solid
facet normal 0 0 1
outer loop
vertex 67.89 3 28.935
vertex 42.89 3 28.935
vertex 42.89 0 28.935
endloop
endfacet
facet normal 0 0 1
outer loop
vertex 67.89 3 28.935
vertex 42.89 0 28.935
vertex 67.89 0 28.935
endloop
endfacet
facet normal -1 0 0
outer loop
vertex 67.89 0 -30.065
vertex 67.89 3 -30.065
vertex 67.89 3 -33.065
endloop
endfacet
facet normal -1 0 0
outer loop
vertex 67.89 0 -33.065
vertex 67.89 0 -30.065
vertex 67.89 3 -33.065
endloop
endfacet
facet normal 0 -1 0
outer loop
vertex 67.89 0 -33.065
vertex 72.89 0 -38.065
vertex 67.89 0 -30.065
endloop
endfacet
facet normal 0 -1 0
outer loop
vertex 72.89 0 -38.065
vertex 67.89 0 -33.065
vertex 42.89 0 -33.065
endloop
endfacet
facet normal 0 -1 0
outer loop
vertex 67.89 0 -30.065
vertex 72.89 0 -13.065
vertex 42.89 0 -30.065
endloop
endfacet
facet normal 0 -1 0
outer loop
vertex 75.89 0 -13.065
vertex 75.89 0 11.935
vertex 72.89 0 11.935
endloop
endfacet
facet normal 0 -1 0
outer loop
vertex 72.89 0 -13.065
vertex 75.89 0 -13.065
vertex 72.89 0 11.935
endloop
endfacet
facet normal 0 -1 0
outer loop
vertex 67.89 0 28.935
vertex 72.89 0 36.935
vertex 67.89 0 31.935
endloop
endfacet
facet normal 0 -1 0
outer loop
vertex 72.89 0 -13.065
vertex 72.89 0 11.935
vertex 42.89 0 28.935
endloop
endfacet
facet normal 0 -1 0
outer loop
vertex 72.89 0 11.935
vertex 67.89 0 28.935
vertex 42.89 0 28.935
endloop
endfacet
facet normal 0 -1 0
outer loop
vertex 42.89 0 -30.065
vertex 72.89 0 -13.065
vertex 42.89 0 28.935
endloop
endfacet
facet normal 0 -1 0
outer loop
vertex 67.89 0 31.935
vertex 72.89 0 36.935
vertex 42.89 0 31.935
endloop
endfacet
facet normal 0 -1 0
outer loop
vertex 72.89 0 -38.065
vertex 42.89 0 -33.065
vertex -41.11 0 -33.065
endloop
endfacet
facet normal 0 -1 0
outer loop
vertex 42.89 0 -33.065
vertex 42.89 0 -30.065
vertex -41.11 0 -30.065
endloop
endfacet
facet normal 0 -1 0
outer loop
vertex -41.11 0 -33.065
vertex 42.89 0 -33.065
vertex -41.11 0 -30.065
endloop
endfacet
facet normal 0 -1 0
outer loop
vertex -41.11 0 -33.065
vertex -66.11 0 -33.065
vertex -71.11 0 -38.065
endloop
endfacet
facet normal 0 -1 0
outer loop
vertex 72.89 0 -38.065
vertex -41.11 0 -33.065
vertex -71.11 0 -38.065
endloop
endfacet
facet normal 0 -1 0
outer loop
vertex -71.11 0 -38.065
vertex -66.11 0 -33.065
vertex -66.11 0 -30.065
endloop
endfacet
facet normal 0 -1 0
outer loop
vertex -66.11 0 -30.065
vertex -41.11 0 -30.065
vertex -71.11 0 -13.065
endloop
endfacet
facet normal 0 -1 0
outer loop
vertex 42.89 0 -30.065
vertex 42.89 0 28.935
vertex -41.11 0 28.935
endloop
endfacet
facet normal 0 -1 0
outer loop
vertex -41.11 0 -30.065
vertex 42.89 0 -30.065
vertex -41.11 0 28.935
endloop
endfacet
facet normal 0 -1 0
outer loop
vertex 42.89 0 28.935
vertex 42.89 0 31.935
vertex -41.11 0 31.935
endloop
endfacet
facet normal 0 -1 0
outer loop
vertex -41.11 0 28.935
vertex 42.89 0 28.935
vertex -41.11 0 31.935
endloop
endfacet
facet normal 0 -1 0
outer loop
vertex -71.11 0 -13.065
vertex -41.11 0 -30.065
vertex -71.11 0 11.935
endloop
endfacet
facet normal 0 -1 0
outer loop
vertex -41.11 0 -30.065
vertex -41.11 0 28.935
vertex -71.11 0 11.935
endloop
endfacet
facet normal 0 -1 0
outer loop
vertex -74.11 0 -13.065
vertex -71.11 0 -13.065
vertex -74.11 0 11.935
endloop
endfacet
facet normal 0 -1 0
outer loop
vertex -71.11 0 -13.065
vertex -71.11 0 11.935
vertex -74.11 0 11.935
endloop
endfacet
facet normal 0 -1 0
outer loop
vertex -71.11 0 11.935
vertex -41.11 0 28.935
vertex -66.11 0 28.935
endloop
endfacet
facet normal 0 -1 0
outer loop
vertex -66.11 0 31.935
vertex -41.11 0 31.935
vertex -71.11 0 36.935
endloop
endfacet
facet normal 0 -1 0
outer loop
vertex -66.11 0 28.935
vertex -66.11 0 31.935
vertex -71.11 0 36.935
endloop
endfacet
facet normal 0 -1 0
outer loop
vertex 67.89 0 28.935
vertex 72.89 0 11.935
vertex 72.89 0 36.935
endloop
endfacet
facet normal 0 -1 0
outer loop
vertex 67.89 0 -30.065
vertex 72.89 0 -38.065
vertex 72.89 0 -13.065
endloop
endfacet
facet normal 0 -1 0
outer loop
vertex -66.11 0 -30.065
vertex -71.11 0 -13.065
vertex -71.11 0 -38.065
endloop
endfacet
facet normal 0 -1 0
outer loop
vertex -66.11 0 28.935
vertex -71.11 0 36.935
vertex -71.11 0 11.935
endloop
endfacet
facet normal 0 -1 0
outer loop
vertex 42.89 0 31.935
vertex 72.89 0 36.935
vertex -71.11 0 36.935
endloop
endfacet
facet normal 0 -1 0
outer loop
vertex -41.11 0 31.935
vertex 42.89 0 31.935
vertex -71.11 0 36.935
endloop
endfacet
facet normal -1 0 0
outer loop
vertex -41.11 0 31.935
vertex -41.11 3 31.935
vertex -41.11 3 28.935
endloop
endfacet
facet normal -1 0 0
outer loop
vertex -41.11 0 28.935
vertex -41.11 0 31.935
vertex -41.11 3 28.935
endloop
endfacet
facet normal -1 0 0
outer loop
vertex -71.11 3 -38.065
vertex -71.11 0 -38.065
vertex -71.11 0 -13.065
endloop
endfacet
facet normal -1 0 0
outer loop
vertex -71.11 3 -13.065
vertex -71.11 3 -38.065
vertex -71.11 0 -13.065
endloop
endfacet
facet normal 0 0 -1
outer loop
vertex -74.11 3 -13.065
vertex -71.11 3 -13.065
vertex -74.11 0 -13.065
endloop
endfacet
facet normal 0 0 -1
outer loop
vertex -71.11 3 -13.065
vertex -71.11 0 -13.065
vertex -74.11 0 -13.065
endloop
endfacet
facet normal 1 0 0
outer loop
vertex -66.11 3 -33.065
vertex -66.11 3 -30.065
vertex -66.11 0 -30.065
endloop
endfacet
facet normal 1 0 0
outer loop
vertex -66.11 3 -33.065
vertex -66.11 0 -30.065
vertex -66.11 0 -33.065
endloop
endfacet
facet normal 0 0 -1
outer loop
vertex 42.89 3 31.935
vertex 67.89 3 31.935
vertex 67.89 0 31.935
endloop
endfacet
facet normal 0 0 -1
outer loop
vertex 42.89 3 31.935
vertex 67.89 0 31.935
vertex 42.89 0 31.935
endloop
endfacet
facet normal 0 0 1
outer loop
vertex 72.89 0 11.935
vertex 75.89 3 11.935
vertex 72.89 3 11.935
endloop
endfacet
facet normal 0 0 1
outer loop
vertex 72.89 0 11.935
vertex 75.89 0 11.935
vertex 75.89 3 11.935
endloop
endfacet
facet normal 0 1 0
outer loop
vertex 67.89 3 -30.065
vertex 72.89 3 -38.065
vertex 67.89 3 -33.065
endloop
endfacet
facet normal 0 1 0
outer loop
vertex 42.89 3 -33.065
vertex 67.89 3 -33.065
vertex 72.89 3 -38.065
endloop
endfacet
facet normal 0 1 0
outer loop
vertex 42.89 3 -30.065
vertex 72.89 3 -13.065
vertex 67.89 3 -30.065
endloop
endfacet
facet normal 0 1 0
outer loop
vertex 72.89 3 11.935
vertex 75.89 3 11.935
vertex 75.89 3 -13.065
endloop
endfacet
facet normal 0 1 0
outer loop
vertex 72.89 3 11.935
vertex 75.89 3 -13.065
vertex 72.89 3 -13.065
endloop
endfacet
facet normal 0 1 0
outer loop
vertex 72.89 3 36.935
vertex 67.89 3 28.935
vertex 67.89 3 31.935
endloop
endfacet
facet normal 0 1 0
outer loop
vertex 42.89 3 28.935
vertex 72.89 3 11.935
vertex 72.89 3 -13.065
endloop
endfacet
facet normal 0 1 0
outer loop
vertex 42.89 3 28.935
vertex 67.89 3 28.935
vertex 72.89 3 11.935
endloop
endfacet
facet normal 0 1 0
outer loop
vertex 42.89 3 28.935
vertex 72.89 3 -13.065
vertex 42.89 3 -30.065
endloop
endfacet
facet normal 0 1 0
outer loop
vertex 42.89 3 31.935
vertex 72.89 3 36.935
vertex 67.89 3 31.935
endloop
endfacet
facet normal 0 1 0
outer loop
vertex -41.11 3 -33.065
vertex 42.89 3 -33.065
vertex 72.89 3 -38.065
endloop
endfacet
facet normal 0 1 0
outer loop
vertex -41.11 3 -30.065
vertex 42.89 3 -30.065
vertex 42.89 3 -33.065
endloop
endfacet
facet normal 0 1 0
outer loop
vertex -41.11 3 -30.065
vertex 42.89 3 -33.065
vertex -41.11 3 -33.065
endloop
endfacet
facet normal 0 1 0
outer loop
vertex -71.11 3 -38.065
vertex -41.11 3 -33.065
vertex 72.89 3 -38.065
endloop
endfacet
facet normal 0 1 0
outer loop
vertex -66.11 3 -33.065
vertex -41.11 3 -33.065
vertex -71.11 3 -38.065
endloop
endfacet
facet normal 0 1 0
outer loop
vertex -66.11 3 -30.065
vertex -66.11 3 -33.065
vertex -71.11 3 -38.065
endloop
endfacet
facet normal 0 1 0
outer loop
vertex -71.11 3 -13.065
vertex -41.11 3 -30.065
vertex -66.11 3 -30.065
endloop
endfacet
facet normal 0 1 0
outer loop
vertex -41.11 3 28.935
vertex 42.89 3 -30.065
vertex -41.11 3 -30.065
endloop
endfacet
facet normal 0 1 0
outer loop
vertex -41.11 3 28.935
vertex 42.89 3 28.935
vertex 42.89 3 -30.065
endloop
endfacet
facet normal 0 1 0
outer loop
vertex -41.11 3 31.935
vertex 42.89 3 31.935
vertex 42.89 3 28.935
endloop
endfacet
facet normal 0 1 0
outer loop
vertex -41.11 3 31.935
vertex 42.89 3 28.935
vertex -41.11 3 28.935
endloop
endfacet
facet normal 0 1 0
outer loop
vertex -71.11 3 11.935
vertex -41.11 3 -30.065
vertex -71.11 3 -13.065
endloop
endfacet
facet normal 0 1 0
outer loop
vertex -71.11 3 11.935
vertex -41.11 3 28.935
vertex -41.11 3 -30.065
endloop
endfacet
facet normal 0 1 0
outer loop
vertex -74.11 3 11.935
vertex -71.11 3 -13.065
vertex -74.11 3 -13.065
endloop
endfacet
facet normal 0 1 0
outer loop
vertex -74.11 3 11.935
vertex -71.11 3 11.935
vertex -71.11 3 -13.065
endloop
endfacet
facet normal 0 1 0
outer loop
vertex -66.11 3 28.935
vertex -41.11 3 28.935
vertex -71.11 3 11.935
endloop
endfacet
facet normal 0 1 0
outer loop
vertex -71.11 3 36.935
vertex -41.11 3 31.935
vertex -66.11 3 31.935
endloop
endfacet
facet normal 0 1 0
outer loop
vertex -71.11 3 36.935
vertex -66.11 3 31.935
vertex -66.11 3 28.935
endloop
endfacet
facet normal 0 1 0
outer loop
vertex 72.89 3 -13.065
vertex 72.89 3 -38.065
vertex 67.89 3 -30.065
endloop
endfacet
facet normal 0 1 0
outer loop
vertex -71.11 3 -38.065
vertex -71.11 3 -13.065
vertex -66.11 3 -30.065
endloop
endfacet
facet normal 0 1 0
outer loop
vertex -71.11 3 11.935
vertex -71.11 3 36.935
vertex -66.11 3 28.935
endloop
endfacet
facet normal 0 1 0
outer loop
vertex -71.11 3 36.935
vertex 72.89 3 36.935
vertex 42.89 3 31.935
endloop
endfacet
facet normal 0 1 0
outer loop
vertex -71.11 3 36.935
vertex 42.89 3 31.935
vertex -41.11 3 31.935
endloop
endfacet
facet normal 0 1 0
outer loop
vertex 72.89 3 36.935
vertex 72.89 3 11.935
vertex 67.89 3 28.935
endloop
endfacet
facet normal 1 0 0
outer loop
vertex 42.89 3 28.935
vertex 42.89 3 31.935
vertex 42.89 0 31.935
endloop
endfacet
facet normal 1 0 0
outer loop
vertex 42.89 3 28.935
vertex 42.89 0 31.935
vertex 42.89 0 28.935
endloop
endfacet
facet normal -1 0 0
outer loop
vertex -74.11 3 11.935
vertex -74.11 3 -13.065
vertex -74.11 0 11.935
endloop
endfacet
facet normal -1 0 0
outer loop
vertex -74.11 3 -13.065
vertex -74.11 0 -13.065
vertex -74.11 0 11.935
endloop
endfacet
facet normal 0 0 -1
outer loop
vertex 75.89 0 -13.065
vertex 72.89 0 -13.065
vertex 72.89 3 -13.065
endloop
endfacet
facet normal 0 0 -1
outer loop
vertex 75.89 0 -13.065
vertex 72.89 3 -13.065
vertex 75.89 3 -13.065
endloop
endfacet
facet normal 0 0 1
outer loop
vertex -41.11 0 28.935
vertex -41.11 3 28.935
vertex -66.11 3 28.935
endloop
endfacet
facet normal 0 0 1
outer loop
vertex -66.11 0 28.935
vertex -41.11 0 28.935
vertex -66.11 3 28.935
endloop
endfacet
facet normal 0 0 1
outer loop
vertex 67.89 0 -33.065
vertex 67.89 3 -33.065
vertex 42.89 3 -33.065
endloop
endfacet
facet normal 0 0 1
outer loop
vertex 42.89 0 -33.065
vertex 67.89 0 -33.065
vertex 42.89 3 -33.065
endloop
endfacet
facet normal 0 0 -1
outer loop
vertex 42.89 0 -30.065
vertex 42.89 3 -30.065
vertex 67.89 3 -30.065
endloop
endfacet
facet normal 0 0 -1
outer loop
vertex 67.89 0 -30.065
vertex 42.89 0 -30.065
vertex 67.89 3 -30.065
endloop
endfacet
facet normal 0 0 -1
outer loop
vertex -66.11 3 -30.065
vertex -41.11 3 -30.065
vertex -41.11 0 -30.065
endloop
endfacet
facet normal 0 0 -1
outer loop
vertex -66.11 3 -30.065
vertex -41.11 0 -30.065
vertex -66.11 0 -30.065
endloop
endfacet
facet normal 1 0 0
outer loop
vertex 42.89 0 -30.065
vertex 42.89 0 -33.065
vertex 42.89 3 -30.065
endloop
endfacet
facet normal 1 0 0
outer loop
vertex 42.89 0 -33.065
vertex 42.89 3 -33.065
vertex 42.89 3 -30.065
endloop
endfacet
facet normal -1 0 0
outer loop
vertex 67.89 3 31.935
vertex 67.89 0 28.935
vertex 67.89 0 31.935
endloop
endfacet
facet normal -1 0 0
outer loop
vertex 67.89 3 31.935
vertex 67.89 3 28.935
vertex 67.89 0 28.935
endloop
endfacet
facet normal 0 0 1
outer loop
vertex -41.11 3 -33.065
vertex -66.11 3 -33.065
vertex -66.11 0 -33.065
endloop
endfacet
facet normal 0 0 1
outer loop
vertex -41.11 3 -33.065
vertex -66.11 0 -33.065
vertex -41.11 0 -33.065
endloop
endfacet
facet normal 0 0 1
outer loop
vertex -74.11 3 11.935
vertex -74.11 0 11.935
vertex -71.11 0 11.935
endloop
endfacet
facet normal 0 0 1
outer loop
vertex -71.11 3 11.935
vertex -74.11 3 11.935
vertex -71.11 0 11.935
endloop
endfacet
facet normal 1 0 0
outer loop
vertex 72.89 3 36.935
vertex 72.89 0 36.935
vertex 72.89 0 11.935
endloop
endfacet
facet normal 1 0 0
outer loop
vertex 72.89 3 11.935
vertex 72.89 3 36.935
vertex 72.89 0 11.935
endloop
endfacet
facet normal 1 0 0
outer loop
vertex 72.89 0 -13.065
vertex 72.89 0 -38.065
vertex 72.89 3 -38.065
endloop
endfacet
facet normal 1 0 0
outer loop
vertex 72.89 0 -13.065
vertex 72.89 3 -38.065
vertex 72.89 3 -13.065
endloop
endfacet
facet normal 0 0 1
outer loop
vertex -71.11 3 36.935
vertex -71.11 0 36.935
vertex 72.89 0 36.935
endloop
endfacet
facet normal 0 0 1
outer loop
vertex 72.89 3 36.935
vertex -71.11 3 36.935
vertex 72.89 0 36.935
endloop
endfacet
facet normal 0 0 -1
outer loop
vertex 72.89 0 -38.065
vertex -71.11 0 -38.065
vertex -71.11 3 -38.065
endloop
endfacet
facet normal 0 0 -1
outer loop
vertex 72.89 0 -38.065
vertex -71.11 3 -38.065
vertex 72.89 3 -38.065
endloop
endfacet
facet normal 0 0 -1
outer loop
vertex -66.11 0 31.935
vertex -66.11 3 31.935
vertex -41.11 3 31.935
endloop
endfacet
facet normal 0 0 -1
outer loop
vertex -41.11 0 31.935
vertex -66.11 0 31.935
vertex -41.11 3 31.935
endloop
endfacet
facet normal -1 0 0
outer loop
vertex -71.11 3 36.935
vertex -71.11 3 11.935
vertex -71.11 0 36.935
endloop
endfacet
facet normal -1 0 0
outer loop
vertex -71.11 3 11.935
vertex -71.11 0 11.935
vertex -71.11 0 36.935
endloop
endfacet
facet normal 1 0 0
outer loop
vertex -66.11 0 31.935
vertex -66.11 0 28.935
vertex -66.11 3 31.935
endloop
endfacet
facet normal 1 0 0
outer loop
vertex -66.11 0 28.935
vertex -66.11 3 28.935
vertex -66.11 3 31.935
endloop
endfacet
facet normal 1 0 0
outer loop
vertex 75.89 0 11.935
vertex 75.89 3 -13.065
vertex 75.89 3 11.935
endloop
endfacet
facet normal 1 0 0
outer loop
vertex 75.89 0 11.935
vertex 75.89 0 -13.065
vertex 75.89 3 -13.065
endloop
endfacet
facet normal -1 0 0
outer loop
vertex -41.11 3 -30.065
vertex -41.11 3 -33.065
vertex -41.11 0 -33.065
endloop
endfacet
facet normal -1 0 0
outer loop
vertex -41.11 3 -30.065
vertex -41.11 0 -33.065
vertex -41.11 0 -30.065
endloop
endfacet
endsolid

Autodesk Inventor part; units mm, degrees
ref_plane "YZ Plane" through (0, 0, 0) normal (1, 0, 0) x (0, 1, 0)
ref_plane "XZ Plane" through (0, 0, 0) normal (0, 1, 0) x (-1, 0, 0)
ref_plane "XY Plane" through (0, 0, 0) normal (0, 0, 1) x (1, 0, 0)
sketch "Sketch1" plane through (0, 0, 0) normal (0, 1, 0) x (-1, 0, 0)
  line L0 (71.1097, -38.0648) -> (71.1097, -13.0648)
  line L1 (71.1097, -13.0648) -> (74.1097, -13.0648)
  line L2 (74.1097, -13.0648) -> (74.1097, 11.9352)
  line L3 (74.1097, 11.9352) -> (71.1097, 11.9352)
  line L4 (71.1097, 11.9352) -> (71.1097, 36.9352)
  line L5 (-72.8903, -38.0648) -> (-72.8903, -13.0648)
  line L6 (-72.8903, 36.9352) -> (-72.8903, 11.9352)
  line L7 (-72.8903, -13.0648) -> (-75.8903, -13.0648)
  line L8 (-75.8903, -13.0648) -> (-75.8903, 11.9352)
  line L9 (-75.8903, 11.9352) -> (-72.8903, 11.9352)
  line L10 (71.1097, -38.0648) -> (-72.8903, -38.0648)
  line L11 (71.1097, 36.9352) -> (-72.8903, 36.9352)
  point P0 (0, 0)
extrude "Extrusion1" add sketch "Sketch1" along normal blind 3
sketch "Sketch2" plane through (0, 3, 0) normal (0, 1, 0) x (1, 0, 0)
  line L0 (-71.1097, -36.9352) -> (72.8903, -36.9352) projected
  line L1 (-66.1097, -31.9352) -> (-56.1097, -31.9352)
  line L2 (-56.1097, -31.9352) -> (-56.1097, -28.9352)
  line L3 (-56.1097, -28.9352) -> (-66.1097, -28.9352)
  line L4 (-66.1097, -28.9352) -> (-66.1097, -31.9352)
  line L5 (72.8903, 38.0648) -> (-71.1097, 38.0648) projected
  line L6 (-56.1097, 30.0648) -> (-66.1097, 30.0648)
  line L7 (-66.1097, 30.0648) -> (-66.1097, 33.0648)
  line L8 (-66.1097, 33.0648) -> (-56.1097, 33.0648)
  line L9 (-56.1097, 33.0648) -> (-56.1097, 30.0648)
  line L10 (67.8903, 33.0648) -> (57.8903, 33.0648)
  line L11 (57.8903, 33.0648) -> (57.8903, 30.0648)
  line L12 (57.8903, 30.0648) -> (67.8903, 30.0648)
  line L13 (67.8903, 30.0648) -> (67.8903, 33.0648)
  line L14 (67.8903, -31.9352) -> (57.8903, -31.9352)
  line L15 (57.8903, -31.9352) -> (57.8903, -28.9352)
  line L16 (57.8903, -28.9352) -> (67.8903, -28.9352)
  line L17 (67.8903, -28.9352) -> (67.8903, -31.9352)
  point P0 (0, 0)
extrude "Extrusion2" cut sketch "Sketch2" against normal blind 30
sketch "Sketch3" plane through (0, 3, 0) normal (0, 1, 0) x (1, 0, 0)
  line L0 (72.8903, 38.0648) -> (-71.1097, 38.0648) projected
  circle A0 centre (-14.1097, 28.0648) radius 5
  circle A1 centre (15.8903, 28.0648) radius 5
  line L1 (-71.1097, -36.9352) -> (72.8903, -36.9352) projected
  circle A2 centre (-14.1097, -26.9352) radius 5
  circle A3 centre (15.8903, -26.9352) radius 5
  point P0 (0, 0)
  dimension "d35" = 10
  dimension "d36" = 10
  dimension "d39" = 10
  dimension "d40" = 10
extrude "Extrusion3" cut sketch "Sketch3" against normal blind 30
sketch "Sketch4" plane through (0, 3, 0) normal (0, 1, 0) x (1, 0, 0)
  line L0 (-56.1097, 33.0648) -> (-56.1097, 30.0648) projected
  line L1 (-56.1097, 33.0648) -> (-41.1097, 33.0648)
  line L2 (-41.1097, 33.0648) -> (-41.1097, 30.0648)
  line L3 (-41.1097, 30.0648) -> (-56.1097, 30.0648)
  line L4 (-56.1097, 30.0648) -> (-56.1097, 33.0648)
  line L5 (57.8903, 33.0648) -> (42.8903, 33.0648)
  line L6 (42.8903, 33.0648) -> (42.8903, 30.0648)
  line L7 (42.8903, 30.0648) -> (57.8903, 30.0648)
  line L8 (57.8903, 30.0648) -> (57.8903, 33.0648)
  line L9 (-56.1097, -31.9352) -> (-66.1097, -31.9352) projected
  line L10 (-56.1097, -31.9352) -> (-41.1097, -31.9352)
  line L11 (-41.1097, -31.9352) -> (-41.1097, -28.9352)
  line L12 (-41.1097, -28.9352) -> (-56.1097, -28.9352)
  line L13 (-56.1097, -28.9352) -> (-56.1097, -31.9352)
  line L14 (57.8903, -31.9352) -> (57.8903, -28.9352) projected
  line L15 (57.8903, -31.9352) -> (42.8903, -31.9352)
  line L16 (42.8903, -31.9352) -> (42.8903, -28.9352)
  line L17 (42.8903, -28.9352) -> (57.8903, -28.9352)
  line L18 (57.8903, -28.9352) -> (57.8903, -31.9352)
  point P0 (0, 0)
  dimension "d43" = 15
  dimension "d44" = 15
extrude "Extrusion4" cut sketch "Sketch4" against normal blind 10
sketch "Sketch5" plane through (0, 3, 0) normal (0, 1, 0) x (1, 0, 0)
  circle A0 centre (-14.1097, 28.0648) radius 5 projected
  circle A1 centre (-14.1097, 28.0648) radius 5
  circle A2 centre (15.8903, 28.0648) radius 5 projected
  circle A3 centre (15.8903, 28.0648) radius 5
  circle A4 centre (15.8903, -26.9352) radius 5 projected
  circle A5 centre (15.8903, -26.9352) radius 5
  circle A6 centre (-14.1097, -26.9352) radius 5 projected
  circle A7 centre (-14.1097, -26.9352) radius 5
  point P0 (0, 0)
extrude "Extrusion5" add sketch "Sketch5" against normal blind 3
properties part number "Level1 (Motoren)"
